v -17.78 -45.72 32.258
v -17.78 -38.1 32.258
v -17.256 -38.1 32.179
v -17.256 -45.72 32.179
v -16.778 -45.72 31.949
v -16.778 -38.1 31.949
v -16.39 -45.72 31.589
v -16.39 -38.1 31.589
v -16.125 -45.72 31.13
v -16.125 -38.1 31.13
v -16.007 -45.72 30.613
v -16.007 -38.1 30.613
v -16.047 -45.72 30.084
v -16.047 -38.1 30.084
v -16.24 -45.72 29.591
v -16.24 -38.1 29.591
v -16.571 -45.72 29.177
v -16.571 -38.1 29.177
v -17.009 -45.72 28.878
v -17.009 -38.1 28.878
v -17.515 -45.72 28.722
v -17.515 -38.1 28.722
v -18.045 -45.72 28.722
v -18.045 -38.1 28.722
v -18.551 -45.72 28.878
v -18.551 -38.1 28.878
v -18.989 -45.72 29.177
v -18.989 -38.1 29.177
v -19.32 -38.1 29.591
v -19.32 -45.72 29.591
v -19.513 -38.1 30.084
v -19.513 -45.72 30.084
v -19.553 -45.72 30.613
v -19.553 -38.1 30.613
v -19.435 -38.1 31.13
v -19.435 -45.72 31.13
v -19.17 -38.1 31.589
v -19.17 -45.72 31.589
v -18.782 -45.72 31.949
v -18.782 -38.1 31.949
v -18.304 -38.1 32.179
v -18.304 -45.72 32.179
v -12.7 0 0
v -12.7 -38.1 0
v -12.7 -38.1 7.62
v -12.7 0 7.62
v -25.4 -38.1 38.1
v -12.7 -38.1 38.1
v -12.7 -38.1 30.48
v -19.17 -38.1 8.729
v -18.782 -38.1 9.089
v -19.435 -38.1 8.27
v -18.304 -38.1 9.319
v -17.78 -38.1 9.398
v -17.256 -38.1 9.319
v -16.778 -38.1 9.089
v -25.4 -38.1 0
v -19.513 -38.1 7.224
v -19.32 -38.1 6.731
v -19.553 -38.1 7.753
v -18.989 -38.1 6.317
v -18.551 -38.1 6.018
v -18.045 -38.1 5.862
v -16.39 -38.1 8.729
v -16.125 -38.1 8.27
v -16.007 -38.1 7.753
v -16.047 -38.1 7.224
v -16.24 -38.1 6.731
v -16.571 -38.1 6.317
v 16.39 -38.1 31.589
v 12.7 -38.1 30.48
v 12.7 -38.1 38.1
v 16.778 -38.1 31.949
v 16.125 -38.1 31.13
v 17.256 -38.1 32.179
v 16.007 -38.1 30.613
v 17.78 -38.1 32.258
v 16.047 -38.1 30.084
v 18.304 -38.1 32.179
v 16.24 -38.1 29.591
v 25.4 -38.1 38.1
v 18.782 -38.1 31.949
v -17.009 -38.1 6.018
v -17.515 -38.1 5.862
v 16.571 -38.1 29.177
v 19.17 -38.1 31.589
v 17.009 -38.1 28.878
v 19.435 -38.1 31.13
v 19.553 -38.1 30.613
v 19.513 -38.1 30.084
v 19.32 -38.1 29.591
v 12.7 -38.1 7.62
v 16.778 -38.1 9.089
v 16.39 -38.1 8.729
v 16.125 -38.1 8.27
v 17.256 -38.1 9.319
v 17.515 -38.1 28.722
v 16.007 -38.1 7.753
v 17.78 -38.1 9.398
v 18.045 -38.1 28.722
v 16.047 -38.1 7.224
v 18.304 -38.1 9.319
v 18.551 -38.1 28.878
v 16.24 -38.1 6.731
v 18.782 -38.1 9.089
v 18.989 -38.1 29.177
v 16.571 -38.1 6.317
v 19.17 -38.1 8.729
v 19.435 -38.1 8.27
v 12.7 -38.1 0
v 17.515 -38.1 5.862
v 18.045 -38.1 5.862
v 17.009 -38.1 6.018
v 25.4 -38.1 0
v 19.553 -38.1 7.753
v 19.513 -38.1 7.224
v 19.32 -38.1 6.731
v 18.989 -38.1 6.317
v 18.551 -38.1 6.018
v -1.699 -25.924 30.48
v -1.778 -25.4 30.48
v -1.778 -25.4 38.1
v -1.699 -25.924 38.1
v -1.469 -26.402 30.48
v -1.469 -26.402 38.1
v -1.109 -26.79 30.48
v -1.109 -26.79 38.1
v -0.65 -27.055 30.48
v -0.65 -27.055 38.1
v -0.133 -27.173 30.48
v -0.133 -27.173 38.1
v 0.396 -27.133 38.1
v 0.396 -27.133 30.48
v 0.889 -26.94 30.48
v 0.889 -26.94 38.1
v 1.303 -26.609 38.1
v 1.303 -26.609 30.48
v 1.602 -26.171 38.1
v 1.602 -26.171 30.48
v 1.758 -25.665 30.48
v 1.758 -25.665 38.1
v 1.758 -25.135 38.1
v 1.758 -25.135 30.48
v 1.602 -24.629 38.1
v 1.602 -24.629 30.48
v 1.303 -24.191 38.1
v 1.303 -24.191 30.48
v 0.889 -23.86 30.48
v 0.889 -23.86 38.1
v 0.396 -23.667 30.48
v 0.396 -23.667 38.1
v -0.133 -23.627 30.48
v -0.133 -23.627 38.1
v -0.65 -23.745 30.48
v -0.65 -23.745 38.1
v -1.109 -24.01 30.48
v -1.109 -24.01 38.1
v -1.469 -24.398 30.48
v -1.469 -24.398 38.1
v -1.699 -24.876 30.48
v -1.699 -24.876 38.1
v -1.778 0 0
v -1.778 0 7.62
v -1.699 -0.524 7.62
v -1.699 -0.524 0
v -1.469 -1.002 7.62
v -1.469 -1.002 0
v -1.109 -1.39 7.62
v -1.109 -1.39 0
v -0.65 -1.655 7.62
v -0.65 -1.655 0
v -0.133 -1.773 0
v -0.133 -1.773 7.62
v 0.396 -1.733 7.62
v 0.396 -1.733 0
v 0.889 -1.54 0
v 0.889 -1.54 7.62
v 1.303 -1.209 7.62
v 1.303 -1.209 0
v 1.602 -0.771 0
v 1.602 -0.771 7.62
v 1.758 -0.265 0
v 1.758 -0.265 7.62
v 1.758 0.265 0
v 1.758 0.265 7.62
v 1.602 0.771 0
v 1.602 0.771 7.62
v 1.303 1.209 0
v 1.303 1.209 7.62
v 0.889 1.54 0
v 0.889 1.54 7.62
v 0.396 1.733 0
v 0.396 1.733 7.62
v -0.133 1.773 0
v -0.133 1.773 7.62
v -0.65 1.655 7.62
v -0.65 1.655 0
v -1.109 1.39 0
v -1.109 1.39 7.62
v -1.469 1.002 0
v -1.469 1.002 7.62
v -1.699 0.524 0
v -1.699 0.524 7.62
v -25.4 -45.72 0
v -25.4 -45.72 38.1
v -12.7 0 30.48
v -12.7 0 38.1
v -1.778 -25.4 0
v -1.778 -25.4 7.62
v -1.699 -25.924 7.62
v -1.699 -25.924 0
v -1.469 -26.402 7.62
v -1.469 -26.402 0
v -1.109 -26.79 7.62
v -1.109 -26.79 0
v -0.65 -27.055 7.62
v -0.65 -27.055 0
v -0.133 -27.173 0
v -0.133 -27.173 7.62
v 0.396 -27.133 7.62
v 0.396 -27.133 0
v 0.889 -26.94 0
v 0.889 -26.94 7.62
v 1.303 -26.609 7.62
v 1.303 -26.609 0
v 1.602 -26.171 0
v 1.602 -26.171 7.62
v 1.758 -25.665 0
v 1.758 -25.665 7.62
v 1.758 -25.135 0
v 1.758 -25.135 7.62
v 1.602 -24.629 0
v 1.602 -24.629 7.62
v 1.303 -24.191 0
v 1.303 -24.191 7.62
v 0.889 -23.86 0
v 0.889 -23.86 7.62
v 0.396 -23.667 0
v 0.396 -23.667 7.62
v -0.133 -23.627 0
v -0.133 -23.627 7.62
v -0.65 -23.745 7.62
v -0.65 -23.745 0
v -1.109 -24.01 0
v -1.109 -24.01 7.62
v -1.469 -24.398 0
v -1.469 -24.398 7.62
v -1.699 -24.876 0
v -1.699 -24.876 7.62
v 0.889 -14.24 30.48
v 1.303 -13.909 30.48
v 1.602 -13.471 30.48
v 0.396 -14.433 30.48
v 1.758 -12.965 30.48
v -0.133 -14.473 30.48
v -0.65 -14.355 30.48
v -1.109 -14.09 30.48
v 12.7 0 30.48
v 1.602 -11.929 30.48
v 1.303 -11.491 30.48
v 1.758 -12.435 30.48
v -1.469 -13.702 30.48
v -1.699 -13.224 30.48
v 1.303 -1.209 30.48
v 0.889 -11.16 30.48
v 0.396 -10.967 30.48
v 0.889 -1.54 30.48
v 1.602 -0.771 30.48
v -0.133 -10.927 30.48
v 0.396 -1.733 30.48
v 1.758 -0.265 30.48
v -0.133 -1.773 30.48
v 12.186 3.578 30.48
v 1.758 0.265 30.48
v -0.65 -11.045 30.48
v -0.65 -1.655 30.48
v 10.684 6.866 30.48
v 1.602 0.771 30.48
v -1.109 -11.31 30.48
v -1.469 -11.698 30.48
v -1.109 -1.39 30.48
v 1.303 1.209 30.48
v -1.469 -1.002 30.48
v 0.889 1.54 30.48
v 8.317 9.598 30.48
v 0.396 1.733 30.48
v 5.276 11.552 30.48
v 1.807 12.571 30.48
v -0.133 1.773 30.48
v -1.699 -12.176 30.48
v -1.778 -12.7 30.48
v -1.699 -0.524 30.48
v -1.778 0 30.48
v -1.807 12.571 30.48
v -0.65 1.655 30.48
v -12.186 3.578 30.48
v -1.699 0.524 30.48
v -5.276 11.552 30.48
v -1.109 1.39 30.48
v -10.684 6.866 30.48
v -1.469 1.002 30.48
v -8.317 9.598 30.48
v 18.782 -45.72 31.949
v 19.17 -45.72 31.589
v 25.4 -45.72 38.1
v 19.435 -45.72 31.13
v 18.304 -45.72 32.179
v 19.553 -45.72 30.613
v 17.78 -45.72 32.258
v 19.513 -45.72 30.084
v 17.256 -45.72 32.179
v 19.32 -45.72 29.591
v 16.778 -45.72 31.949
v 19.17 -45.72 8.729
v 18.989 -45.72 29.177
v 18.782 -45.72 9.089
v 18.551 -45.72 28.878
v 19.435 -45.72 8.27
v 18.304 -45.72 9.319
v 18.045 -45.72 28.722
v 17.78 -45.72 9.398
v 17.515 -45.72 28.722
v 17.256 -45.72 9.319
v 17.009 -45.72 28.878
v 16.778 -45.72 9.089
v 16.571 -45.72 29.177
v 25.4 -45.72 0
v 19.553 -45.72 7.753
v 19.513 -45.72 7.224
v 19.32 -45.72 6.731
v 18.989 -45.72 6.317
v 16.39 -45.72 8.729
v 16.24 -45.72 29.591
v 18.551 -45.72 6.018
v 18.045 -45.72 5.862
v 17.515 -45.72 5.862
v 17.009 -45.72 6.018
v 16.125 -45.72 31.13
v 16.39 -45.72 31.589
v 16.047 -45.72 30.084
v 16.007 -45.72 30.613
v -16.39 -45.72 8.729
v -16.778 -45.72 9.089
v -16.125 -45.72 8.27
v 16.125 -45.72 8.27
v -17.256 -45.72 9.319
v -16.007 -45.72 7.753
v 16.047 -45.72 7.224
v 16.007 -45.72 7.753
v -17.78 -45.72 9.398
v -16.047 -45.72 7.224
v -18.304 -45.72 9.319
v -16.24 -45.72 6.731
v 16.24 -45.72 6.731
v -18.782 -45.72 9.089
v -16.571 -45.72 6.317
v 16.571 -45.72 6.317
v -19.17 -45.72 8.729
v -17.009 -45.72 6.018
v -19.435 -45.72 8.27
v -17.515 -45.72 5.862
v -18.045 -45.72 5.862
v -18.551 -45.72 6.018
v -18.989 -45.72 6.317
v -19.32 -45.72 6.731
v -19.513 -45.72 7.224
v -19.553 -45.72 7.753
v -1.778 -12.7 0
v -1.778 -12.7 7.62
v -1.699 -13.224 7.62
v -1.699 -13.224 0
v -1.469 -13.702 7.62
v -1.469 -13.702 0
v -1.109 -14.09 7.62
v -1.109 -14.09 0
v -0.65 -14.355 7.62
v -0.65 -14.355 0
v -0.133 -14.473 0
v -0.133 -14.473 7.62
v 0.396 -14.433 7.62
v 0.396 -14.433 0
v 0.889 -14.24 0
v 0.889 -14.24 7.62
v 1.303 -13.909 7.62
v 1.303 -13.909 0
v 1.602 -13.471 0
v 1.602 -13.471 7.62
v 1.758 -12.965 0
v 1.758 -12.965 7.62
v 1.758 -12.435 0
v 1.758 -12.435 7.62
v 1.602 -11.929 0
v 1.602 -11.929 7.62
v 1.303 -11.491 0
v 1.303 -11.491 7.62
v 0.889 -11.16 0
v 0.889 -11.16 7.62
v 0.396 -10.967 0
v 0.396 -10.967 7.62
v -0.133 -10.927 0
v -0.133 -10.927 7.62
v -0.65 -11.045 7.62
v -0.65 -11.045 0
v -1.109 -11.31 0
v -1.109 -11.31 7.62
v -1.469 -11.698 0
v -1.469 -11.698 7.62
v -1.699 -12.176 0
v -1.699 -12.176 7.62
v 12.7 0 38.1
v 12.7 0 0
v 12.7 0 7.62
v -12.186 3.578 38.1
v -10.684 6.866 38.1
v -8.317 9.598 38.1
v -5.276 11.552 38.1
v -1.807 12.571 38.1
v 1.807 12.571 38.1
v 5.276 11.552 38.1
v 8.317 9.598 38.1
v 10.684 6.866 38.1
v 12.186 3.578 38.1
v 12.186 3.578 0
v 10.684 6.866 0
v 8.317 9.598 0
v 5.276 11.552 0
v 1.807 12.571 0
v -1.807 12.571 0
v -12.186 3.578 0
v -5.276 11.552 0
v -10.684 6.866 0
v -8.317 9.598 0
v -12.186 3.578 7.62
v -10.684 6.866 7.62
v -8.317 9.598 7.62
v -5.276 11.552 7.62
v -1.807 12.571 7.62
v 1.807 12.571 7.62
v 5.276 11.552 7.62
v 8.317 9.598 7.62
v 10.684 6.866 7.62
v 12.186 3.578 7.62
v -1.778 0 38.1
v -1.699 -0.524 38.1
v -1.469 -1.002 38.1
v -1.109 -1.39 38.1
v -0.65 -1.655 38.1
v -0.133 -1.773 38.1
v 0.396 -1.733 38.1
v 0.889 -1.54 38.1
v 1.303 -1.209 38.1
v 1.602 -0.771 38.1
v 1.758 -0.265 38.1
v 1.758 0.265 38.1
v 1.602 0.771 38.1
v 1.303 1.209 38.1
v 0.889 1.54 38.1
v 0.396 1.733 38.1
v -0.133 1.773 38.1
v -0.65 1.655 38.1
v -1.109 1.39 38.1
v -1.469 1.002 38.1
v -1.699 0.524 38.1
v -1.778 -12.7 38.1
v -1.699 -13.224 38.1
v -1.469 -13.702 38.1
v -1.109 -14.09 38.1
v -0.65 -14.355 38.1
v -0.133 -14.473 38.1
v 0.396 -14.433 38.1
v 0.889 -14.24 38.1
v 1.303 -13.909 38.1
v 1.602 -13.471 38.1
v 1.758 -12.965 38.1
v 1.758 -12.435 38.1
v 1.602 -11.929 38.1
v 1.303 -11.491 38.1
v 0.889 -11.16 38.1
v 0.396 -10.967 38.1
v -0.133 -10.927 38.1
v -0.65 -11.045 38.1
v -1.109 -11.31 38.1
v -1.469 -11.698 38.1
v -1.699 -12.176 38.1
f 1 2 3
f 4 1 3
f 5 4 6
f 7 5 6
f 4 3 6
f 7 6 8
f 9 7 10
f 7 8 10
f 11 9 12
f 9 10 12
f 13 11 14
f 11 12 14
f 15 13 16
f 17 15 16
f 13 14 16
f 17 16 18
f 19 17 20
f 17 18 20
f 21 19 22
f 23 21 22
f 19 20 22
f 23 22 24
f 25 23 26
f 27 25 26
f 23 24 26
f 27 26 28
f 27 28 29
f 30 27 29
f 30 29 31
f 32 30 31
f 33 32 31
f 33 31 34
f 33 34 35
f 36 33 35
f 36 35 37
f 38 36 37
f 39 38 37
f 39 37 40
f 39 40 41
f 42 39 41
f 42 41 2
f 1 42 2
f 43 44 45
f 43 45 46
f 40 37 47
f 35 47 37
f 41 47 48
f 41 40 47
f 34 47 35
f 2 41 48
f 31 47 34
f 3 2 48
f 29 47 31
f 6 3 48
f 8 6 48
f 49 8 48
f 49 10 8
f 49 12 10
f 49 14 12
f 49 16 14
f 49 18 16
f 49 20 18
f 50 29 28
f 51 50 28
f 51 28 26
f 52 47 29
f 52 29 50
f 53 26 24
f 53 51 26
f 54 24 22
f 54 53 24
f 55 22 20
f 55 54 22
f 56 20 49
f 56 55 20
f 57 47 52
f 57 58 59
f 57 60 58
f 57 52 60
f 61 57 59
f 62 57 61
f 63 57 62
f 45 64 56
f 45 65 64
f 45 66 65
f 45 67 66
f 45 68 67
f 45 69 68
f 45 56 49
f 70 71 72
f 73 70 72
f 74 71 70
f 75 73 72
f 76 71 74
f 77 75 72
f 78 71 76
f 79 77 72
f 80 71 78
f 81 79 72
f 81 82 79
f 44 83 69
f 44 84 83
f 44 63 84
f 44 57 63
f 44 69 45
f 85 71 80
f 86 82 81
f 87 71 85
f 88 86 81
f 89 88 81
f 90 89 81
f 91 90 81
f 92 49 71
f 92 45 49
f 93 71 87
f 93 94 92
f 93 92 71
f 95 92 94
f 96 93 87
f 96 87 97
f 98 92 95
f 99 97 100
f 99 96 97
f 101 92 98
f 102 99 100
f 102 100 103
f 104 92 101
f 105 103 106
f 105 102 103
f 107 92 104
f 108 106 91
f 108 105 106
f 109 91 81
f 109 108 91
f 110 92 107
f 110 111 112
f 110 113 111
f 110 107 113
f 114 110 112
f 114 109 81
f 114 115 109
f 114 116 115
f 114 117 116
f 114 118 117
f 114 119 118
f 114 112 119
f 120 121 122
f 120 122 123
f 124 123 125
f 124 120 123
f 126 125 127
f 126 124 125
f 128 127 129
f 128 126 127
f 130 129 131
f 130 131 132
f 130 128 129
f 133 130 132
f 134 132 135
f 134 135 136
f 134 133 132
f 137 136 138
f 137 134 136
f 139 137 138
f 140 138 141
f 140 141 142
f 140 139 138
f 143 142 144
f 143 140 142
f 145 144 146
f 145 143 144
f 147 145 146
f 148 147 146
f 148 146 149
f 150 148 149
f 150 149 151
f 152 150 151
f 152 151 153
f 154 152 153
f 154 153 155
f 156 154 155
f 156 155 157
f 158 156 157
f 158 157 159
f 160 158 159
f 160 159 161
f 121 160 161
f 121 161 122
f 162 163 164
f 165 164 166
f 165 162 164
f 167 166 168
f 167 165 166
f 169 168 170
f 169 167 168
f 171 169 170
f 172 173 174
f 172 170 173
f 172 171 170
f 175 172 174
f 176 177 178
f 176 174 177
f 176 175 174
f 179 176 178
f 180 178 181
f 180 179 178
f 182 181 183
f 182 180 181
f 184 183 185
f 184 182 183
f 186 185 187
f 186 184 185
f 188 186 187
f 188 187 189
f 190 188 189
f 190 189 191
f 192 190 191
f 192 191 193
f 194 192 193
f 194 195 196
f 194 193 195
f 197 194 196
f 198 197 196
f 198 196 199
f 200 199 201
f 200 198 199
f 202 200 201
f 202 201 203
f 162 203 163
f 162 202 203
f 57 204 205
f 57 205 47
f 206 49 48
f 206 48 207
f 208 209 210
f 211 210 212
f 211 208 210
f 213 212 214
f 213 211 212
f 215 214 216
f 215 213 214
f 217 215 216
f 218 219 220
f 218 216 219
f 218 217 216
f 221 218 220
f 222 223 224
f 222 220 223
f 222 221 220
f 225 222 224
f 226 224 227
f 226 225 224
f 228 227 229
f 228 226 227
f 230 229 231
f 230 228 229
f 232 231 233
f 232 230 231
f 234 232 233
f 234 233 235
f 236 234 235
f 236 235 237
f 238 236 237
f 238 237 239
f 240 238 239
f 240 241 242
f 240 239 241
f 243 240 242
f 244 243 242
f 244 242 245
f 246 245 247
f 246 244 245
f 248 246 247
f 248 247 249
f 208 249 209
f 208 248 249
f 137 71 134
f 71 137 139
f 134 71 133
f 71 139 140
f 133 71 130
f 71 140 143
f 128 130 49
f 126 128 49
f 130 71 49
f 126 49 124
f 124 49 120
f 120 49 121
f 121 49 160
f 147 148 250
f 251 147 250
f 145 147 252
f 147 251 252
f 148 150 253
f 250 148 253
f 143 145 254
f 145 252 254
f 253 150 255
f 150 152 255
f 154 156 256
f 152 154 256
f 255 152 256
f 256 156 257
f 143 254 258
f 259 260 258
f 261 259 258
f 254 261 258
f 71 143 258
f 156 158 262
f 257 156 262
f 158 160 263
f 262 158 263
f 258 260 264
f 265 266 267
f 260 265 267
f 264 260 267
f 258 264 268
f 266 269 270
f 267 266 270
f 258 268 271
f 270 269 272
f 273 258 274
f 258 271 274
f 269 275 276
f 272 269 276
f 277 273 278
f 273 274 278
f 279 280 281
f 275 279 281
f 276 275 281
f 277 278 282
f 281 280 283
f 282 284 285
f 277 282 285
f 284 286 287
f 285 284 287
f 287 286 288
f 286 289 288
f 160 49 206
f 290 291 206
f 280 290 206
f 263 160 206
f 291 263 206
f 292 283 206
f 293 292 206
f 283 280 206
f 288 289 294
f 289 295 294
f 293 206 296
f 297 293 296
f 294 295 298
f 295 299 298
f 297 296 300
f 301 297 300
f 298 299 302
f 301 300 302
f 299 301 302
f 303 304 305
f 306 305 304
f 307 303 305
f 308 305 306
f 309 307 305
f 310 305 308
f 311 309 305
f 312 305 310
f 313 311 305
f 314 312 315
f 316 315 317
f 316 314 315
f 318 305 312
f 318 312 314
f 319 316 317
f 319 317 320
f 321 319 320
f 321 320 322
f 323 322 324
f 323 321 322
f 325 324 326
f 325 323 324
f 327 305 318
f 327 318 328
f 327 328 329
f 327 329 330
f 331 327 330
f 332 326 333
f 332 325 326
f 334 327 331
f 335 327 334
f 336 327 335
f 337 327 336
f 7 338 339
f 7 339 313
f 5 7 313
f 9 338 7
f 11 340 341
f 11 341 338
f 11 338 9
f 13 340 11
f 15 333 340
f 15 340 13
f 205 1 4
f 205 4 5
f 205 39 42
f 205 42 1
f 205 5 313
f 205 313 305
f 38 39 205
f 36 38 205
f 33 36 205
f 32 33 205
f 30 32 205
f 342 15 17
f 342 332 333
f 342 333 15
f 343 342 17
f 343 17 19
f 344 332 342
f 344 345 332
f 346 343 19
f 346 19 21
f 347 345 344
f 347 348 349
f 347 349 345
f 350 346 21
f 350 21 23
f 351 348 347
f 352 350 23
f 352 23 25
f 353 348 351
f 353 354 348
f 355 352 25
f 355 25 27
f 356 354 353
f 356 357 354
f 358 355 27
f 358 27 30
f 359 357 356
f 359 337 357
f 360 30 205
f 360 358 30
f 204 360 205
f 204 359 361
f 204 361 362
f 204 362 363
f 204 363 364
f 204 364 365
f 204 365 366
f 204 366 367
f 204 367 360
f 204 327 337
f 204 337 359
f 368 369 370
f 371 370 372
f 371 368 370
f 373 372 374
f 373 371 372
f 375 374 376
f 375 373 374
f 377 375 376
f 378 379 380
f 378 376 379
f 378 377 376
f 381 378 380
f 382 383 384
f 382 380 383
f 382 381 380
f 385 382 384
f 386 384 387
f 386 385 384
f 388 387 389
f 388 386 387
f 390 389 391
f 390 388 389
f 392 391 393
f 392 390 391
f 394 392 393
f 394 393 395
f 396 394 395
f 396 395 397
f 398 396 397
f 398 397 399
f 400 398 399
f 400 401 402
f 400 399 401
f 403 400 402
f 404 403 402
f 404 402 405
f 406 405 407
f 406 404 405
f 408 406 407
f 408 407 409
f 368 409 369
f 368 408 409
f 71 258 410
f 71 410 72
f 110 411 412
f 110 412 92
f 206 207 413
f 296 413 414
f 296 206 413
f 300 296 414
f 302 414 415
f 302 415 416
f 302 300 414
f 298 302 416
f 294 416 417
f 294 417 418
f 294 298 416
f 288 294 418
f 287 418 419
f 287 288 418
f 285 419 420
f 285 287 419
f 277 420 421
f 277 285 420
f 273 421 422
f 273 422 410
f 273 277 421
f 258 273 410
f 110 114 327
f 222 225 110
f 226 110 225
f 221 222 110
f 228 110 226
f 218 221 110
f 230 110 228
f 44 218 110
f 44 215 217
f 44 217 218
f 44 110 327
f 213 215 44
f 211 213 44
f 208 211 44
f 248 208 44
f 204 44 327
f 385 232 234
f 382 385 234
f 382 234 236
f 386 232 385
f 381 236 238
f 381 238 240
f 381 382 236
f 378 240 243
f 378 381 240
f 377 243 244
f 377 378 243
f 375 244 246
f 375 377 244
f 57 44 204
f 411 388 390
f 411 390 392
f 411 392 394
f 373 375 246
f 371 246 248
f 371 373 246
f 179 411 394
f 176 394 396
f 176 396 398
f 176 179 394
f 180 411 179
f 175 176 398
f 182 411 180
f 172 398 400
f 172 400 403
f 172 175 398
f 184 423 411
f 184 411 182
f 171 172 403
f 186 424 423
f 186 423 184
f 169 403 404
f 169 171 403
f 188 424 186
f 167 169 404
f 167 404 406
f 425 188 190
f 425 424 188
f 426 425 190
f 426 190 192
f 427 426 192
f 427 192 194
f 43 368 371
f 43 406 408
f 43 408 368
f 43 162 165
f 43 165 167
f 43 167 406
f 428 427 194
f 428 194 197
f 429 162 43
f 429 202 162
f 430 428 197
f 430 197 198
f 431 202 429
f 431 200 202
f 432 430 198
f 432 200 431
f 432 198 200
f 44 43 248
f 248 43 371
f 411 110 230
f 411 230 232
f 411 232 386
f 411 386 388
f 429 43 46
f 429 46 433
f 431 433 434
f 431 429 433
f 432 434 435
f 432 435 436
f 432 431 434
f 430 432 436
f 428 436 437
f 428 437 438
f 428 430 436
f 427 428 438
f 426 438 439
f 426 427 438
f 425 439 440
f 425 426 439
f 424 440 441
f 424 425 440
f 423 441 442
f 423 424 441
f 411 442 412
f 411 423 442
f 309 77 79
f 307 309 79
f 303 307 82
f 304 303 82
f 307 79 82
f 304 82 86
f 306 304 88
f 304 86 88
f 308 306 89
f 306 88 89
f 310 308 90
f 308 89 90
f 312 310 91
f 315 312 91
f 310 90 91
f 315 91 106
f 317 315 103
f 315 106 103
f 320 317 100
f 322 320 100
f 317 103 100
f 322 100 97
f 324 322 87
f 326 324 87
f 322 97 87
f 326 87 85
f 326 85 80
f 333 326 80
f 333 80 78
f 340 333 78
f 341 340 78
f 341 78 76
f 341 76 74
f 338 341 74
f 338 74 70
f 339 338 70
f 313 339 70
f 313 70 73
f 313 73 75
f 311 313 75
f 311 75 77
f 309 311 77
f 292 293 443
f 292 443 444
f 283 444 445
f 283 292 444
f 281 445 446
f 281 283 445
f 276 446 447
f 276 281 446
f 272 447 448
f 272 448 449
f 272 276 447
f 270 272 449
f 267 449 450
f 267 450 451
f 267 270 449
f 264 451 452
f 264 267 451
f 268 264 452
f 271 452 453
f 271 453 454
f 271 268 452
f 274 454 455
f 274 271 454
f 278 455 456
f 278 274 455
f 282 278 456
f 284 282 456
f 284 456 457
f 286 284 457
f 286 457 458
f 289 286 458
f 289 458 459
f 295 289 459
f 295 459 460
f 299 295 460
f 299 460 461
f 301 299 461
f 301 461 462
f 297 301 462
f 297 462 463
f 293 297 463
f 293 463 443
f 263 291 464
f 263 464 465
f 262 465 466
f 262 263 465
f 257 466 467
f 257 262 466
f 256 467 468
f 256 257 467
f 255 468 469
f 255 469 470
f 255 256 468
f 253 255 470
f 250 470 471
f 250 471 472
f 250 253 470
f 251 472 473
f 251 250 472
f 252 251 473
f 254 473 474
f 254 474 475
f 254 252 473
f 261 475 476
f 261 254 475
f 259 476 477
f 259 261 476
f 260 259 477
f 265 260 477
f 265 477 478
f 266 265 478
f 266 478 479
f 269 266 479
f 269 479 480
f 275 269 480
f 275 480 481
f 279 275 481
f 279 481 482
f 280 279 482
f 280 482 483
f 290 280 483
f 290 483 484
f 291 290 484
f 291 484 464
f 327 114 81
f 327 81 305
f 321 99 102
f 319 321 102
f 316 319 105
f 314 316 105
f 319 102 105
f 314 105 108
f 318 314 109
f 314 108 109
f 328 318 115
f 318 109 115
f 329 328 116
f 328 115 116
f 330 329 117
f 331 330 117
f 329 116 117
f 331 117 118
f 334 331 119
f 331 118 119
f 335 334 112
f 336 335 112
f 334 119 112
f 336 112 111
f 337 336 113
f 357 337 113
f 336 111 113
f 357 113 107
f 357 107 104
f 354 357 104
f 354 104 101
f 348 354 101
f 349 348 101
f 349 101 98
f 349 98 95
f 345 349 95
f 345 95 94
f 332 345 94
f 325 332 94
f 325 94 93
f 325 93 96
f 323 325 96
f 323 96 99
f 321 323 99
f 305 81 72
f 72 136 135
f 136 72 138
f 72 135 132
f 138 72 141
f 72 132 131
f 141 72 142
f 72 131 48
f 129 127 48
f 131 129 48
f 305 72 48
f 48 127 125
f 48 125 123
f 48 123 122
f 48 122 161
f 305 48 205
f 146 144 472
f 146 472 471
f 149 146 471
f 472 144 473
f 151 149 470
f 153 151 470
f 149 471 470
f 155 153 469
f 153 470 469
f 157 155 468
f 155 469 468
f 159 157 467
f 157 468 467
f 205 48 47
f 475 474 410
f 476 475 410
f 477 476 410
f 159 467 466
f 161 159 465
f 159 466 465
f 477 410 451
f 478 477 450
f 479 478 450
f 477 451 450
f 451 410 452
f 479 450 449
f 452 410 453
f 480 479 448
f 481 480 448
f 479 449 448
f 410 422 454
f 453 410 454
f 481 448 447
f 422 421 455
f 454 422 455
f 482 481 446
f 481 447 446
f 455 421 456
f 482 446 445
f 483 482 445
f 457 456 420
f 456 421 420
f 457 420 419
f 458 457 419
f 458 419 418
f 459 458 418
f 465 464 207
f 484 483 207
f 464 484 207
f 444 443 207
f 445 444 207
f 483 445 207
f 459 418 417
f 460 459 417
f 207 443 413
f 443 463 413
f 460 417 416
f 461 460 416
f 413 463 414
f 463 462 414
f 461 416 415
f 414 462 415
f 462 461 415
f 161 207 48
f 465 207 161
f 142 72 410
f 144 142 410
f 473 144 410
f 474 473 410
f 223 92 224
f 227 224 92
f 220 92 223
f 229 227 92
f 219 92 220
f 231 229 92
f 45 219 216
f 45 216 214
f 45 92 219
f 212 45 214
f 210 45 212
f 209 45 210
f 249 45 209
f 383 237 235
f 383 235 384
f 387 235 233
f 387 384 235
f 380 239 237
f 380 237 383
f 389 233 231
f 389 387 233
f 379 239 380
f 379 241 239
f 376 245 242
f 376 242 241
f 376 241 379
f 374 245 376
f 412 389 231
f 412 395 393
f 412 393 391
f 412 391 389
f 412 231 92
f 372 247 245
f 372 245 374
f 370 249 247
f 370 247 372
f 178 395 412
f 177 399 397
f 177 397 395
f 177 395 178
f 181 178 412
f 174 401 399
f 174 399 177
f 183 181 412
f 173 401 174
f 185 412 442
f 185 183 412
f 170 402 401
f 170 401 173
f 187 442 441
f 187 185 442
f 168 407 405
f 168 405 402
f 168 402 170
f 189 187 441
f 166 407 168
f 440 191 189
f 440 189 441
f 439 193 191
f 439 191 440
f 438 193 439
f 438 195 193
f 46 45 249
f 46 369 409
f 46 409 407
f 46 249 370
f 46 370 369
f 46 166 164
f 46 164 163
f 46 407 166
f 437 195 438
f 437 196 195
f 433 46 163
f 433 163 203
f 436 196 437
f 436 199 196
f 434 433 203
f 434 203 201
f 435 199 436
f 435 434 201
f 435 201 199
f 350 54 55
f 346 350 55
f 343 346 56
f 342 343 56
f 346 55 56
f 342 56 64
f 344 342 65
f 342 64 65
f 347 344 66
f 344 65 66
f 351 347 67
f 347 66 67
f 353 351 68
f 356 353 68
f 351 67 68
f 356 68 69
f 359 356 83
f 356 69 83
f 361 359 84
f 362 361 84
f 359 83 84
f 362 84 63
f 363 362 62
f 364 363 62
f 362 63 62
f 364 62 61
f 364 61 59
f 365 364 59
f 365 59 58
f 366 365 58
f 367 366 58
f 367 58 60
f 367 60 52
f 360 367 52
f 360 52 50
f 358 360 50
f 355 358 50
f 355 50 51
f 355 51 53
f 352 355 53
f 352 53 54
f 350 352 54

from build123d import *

# Parameters (mm, degrees)
SKETCH3_R               = 1.778
BOSS_EXTRUDE2_DEPTH     = 38.1
CUT_EXTRUDE3_DEPTH      = 65.707715151
CUT_EXTRUDE3_DEPTH_BACK = 65.707715151
SKETCH11_W              = 22.86
SKETCH11_H              = 50.8
SKETCH8_R               = 1.778
CUT_EXTRUDE4_DEPTH      = 65.707715151


with BuildPart() as part:
    # Sketch3 → Boss-Extrude2 (new body)
    with BuildSketch(Plane.XY):
        with BuildLine():
            Line((12.7, -38.1), (25.4, -38.1))
            Line((25.4, -38.1), (25.4, -45.72))
            Line((25.4, -45.72), (-25.4, -45.72))
            Line((-25.4, -45.72), (-25.4, -38.1))
            Line((-25.4, -38.1), (-12.7, -38.1))
            Line((-12.7, -38.1), (-12.7, 0))
            ThreePointArc((-12.7, 0), (0, 12.7), (12.7, 0))
            Line((12.7, 0), (12.7, -38.1))
        make_face()
        with Locations(Location((0, 0, 0), (0, 0, 180))):
            Circle(SKETCH3_R, mode=Mode.SUBTRACT)
        with Locations(Location((0, -12.7, 0), (0, 0, 180))):
            Circle(SKETCH3_R, mode=Mode.SUBTRACT)
        with Locations(Location((0, -25.4, 0), (0, 0, 180))):
            Circle(SKETCH3_R, mode=Mode.SUBTRACT)
    extrude(amount=BOSS_EXTRUDE2_DEPTH)

    # Sketch11 → Cut-Extrude3 (cut, two sides: drawn at the far end of the back side and taken through both)
    with BuildSketch(Plane(origin=(0, 0, 0), x_dir=(0, 0, -1), z_dir=(1, 0, 0)).offset(-CUT_EXTRUDE3_DEPTH_BACK)):
        with Locations((-19.05, -12.7)):
            Rectangle(SKETCH11_W, SKETCH11_H)
    extrude(amount=CUT_EXTRUDE3_DEPTH + CUT_EXTRUDE3_DEPTH_BACK, mode=Mode.SUBTRACT)

    # Sketch8 → Cut-Extrude4 (cut, through all)
    with BuildSketch(Plane(origin=(0, 0, 0), x_dir=(1, 0, 0), z_dir=(0, 1, 0))):
        with Locations(Location((-17.78, -7.62, 0), (0, 0, 270))):
            Circle(SKETCH8_R)
        with Locations(Location((17.78, -7.62, 0), (0, 0, 270))):
            Circle(SKETCH8_R)
        with Locations(Location((17.78, -30.48, 0), (0, 0, 270))):
            Circle(SKETCH8_R)
        with Locations(Location((-17.78, -30.48, 0), (0, 0, 270))):
            Circle(SKETCH8_R)
    extrude(amount=-CUT_EXTRUDE4_DEPTH, mode=Mode.SUBTRACT)


solid = part.part
